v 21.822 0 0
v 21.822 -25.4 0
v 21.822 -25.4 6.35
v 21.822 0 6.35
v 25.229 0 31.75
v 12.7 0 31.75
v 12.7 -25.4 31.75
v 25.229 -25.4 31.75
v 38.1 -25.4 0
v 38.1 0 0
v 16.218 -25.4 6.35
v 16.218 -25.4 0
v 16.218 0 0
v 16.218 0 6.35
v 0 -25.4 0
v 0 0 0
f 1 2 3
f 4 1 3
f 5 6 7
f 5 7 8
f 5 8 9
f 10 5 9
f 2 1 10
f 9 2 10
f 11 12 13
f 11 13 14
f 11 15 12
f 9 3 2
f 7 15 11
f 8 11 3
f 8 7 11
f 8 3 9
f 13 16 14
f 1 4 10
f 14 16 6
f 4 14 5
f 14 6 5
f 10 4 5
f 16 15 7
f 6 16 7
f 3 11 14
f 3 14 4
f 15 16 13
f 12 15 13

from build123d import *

# Parameters (mm, degrees)
F0_W     = 38.1
F0_H     = 31.75
F1_DEPTH = 25.4
F2_W     = 5.603711
F2_H     = 6.35
F3_DEPTH = 25.4


with BuildPart() as f1:
    # F0 (on Front) → F1 (new body)
    with BuildSketch(Plane.XZ):
        with Locations((19.05, 15.875)):
            Rectangle(F0_W, F0_H)
    extrude(amount=F1_DEPTH)

    # F2 (on face) → F3 (cut)
    with BuildSketch(Plane.XZ.offset(25.4)):
        with Locations((19.020174, 3.175)):
            Rectangle(F2_W, F2_H)
        Polygon((0, 31.75), (0, 0), (12.7, 31.75), align=None)
        Polygon((25.229283, 31.75), (38.1, 0), (38.1, 31.75), align=None)
    extrude(amount=-F3_DEPTH, mode=Mode.SUBTRACT)


solid = f1.part
